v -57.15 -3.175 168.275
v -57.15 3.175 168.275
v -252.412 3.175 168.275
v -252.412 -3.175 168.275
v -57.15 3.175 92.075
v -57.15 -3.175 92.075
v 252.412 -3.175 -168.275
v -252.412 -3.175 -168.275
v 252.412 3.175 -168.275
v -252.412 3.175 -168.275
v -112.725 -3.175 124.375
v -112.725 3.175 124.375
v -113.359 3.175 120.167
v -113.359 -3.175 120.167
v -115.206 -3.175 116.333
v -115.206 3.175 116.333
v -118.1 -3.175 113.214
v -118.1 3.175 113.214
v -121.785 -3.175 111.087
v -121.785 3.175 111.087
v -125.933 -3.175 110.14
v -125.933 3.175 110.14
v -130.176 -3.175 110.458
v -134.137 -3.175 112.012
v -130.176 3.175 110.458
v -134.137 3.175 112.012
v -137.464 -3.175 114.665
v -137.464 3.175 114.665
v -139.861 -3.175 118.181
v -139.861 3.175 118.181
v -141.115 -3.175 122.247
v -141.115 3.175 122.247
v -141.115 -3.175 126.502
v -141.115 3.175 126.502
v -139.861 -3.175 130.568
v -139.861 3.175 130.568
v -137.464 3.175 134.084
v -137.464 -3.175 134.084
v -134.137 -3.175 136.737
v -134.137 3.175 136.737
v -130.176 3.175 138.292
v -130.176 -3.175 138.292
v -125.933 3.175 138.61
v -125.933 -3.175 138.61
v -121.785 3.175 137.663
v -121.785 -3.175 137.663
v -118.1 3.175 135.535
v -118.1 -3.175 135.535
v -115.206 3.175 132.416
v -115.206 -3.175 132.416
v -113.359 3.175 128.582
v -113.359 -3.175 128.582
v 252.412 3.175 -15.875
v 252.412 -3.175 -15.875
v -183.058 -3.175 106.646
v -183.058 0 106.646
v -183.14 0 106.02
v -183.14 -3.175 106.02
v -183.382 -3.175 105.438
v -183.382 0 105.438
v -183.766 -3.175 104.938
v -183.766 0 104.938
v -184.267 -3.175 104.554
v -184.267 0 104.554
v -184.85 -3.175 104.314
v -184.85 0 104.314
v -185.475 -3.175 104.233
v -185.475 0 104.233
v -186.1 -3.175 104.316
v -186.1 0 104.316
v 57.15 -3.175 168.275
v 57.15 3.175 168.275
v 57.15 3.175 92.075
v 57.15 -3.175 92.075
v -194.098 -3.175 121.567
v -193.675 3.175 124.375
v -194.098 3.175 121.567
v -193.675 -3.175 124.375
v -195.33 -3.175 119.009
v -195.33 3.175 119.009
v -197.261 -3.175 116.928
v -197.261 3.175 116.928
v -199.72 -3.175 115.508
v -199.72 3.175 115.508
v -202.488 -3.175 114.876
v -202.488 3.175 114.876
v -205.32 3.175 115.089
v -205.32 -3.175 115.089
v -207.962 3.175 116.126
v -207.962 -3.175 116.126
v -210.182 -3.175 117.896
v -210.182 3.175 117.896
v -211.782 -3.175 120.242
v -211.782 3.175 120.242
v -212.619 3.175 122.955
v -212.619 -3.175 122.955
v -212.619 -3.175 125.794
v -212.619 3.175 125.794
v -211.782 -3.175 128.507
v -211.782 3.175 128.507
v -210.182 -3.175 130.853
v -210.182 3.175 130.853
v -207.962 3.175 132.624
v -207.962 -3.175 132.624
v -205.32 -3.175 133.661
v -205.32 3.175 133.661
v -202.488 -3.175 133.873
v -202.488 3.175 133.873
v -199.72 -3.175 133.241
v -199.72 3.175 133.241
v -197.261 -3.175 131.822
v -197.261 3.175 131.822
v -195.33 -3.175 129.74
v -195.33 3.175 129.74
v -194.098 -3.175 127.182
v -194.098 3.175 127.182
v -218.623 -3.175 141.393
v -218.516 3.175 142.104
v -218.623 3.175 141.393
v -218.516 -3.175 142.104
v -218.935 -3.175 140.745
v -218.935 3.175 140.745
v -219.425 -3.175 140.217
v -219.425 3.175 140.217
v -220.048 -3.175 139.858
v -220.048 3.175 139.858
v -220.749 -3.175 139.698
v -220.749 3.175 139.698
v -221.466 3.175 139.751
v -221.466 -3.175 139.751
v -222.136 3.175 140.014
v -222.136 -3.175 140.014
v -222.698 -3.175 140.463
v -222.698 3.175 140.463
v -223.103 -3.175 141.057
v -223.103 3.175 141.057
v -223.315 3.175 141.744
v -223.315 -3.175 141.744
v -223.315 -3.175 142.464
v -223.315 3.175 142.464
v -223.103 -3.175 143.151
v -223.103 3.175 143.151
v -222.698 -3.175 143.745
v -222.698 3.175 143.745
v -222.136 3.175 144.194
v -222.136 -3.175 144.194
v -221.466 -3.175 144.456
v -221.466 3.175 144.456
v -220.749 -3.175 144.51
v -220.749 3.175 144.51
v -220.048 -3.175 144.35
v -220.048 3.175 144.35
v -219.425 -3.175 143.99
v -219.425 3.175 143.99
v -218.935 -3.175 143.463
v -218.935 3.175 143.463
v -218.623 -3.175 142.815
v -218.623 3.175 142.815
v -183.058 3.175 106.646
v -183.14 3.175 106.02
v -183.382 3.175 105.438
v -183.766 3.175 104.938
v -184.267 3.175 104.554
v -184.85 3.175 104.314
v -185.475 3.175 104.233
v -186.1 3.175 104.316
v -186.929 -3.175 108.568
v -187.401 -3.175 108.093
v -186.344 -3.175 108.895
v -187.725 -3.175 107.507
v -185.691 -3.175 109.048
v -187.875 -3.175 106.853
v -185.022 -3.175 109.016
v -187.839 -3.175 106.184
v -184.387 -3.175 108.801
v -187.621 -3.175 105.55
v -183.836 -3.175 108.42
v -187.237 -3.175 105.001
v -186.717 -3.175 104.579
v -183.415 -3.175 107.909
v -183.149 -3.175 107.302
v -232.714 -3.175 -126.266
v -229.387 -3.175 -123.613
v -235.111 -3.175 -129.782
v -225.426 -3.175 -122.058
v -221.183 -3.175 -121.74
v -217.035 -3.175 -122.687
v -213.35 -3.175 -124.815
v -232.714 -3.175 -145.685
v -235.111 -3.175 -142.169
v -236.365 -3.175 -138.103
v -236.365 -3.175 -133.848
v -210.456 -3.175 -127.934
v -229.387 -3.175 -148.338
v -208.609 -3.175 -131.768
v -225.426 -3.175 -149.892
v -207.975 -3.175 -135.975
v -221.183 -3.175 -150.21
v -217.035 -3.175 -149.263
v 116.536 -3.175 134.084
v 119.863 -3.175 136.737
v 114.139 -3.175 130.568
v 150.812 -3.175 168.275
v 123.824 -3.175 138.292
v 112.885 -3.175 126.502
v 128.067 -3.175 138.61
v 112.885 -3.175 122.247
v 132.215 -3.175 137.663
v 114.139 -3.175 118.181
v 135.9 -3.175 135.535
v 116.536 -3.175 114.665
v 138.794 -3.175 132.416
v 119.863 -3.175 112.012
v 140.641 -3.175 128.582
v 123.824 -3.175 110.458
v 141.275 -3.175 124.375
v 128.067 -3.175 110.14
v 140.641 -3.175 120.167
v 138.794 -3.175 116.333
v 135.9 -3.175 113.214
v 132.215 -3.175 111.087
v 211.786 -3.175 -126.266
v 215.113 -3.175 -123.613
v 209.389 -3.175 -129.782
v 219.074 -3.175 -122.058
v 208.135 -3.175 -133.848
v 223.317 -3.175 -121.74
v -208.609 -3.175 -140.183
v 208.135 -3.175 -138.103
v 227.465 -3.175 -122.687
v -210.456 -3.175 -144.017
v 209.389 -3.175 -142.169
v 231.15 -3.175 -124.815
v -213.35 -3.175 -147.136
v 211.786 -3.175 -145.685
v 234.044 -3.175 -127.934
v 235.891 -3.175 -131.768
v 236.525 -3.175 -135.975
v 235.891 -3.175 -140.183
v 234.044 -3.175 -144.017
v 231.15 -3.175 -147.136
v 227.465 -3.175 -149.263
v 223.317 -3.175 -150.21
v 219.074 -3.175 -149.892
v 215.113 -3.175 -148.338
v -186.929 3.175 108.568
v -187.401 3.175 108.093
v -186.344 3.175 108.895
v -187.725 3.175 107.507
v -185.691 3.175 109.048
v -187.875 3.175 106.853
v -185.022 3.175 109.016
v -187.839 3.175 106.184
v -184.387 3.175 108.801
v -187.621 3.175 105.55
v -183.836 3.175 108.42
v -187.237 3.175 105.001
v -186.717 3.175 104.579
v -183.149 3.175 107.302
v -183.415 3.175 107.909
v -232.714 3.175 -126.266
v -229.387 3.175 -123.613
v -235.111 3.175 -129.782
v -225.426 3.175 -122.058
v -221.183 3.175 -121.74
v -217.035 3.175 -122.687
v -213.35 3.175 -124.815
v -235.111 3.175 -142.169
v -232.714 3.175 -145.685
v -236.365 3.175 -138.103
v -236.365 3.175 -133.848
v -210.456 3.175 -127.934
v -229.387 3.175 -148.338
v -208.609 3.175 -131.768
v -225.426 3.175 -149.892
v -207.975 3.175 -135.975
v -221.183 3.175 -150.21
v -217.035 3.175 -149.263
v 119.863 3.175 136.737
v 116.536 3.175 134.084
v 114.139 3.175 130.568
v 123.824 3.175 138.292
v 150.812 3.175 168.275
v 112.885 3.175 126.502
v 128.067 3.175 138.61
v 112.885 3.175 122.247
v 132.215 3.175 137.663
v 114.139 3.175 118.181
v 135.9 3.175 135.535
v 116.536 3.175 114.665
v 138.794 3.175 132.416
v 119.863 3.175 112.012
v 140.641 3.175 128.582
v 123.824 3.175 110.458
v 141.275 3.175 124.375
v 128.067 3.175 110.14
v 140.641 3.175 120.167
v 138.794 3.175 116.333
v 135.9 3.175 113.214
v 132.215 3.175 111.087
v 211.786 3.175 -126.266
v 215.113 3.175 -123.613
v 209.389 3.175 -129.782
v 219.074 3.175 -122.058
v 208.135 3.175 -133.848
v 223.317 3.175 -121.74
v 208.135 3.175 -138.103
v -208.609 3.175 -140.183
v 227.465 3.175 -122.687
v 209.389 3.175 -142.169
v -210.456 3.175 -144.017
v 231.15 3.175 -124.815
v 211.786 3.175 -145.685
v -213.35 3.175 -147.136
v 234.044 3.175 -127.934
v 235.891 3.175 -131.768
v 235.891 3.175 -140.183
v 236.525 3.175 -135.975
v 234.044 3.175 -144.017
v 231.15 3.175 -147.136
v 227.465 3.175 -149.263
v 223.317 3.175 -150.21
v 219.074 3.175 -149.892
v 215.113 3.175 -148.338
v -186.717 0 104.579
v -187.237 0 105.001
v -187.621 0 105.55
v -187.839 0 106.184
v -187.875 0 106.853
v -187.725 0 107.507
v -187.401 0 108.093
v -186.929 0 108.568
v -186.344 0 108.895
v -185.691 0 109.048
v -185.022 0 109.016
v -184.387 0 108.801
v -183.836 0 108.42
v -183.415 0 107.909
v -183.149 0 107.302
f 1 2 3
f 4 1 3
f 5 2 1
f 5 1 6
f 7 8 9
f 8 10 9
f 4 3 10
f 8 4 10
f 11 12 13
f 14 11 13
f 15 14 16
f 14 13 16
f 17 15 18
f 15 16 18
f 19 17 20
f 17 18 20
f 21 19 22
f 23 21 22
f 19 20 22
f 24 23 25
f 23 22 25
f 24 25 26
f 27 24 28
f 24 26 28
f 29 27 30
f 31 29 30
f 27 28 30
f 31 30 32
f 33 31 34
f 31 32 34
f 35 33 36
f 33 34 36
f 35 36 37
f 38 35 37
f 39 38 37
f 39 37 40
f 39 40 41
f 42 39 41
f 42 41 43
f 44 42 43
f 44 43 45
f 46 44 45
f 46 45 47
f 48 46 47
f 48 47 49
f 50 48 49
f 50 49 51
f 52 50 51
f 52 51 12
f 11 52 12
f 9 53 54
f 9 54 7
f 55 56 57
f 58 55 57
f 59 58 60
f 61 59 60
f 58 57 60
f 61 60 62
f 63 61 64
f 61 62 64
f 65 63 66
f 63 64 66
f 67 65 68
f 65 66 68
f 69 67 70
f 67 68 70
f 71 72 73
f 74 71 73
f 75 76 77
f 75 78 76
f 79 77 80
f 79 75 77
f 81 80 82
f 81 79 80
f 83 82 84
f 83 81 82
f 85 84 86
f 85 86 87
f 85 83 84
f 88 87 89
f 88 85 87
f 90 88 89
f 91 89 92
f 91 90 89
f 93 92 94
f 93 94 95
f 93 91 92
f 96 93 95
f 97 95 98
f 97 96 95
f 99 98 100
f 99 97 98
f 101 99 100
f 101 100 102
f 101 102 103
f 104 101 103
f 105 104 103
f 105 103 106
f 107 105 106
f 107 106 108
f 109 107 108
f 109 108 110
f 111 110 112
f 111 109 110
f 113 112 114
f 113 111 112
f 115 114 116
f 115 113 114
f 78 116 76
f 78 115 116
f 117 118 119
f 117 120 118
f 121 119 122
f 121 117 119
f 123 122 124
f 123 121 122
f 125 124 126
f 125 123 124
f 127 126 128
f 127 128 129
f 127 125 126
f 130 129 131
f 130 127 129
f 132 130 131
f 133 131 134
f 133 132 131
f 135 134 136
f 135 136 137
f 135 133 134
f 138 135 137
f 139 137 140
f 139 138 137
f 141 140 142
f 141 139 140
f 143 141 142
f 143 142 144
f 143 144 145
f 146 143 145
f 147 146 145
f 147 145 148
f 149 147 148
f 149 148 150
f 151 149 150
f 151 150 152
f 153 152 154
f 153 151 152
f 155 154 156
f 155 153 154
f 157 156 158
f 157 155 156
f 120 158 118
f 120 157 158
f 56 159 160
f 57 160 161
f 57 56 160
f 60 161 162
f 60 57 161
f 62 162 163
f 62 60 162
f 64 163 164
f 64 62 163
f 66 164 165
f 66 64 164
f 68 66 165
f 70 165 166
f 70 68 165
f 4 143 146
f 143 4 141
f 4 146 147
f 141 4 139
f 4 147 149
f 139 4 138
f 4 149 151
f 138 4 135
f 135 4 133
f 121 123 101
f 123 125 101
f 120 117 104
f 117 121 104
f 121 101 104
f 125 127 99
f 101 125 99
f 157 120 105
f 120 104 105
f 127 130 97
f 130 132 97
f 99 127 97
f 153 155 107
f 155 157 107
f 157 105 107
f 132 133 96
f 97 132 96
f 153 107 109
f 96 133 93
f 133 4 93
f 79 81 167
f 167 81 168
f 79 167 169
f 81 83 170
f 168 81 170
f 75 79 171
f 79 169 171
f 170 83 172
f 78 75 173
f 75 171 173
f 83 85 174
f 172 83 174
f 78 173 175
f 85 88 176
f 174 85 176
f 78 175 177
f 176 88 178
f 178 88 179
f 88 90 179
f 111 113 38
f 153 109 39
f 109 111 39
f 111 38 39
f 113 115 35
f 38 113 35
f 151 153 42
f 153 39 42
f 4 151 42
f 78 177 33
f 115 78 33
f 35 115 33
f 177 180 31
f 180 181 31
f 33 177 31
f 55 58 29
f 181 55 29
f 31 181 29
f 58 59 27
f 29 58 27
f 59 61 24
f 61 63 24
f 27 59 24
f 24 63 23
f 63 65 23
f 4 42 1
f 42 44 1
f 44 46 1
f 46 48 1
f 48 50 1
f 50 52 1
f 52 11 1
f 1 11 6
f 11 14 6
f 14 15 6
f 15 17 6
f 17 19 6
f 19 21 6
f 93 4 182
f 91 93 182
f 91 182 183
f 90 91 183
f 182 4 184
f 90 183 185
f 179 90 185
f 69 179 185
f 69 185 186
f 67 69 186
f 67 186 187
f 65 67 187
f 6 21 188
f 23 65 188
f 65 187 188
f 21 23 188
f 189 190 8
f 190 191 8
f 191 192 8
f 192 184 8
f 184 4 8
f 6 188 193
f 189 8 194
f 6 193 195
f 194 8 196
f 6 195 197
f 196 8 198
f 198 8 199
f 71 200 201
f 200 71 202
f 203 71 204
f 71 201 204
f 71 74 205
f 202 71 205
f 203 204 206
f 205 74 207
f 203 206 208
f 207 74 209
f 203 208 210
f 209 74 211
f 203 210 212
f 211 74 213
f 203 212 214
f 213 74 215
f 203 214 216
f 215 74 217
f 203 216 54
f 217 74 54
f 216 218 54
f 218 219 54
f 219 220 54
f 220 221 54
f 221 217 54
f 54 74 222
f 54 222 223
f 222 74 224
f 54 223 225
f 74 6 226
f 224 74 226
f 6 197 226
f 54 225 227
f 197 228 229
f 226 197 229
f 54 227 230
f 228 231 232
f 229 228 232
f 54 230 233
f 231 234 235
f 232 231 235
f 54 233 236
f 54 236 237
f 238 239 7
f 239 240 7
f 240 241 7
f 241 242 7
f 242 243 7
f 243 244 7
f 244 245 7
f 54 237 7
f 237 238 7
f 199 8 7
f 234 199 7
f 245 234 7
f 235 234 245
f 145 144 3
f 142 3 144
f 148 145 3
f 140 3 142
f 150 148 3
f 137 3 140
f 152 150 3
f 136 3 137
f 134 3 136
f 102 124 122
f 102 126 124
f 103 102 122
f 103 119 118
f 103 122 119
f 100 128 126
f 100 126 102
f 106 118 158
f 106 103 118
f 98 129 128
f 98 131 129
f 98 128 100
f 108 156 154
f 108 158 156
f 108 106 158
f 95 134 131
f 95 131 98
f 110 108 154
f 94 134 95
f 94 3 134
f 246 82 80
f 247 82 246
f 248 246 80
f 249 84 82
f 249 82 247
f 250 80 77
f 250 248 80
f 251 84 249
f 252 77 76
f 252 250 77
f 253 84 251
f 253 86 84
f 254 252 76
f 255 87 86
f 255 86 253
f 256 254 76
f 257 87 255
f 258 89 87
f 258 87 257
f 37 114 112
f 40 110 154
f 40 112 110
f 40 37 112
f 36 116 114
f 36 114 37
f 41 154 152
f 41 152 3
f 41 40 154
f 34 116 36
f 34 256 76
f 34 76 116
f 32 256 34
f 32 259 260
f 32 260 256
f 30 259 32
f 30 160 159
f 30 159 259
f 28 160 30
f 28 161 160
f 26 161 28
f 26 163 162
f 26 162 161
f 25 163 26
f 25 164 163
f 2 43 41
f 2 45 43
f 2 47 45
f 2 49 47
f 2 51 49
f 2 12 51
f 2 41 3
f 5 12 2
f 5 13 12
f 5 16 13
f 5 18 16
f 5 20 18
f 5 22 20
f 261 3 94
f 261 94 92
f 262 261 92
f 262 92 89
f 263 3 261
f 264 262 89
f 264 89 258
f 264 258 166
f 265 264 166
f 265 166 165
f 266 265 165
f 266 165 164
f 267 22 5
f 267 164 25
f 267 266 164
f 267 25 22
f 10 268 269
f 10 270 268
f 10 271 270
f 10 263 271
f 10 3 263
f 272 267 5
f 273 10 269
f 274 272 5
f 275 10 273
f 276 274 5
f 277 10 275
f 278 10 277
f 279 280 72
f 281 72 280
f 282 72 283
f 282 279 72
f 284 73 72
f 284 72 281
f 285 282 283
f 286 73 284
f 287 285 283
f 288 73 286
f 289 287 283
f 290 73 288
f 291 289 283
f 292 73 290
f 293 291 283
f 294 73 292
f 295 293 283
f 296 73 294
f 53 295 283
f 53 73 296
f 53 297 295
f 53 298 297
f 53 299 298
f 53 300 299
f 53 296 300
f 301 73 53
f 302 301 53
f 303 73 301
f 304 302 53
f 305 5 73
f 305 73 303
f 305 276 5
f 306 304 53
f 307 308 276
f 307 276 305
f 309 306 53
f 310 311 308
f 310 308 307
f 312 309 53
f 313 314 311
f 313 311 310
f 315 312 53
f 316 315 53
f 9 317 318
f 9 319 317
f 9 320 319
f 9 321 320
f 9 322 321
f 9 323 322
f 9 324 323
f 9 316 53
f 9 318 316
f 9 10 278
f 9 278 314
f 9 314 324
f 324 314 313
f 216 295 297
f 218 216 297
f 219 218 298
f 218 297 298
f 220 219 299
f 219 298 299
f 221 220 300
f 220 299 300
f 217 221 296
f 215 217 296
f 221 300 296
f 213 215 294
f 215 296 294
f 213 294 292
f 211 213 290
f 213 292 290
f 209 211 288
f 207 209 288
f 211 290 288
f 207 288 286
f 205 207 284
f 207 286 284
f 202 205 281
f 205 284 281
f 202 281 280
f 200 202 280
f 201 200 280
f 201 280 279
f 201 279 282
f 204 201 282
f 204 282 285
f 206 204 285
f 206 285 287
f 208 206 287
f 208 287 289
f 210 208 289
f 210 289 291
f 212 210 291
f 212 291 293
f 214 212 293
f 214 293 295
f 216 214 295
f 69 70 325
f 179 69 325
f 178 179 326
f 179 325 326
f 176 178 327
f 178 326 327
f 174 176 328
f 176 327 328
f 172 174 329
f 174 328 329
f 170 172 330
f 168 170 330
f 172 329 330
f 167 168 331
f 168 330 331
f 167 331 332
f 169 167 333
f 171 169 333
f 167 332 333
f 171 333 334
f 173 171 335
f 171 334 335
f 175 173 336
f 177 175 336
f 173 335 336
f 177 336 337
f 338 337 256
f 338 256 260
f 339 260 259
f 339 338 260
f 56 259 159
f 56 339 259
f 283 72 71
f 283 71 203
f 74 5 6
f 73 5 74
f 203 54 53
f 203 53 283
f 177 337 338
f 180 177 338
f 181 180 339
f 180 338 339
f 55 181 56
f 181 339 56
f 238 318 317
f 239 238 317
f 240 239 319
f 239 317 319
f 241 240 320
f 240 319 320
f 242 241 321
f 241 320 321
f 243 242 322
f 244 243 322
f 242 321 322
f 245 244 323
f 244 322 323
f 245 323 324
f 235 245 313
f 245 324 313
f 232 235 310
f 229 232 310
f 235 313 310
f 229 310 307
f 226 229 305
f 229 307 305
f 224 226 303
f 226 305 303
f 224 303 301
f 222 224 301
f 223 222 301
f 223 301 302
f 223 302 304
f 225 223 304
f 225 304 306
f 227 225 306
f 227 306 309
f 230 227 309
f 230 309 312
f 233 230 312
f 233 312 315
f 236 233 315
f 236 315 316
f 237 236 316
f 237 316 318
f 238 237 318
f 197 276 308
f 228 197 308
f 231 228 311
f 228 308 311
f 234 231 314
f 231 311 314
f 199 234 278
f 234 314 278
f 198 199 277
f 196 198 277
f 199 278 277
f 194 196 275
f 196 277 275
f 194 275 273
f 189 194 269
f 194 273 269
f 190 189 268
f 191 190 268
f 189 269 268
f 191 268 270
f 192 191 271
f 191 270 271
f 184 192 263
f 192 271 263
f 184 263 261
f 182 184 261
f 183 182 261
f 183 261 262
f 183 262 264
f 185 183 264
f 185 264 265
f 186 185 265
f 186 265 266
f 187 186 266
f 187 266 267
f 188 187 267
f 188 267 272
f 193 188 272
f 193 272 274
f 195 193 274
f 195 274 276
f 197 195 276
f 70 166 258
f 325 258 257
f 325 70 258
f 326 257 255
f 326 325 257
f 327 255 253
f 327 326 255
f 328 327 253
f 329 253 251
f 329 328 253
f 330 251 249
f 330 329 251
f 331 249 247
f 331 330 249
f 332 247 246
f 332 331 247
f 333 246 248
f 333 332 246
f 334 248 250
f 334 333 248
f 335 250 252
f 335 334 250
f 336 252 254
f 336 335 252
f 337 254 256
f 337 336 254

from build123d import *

# Parameters (mm, degrees)
SKETCH1_W               = 504.825
SKETCH1_H               = 336.55
BOSS_EXTRUDE1_DEPTH     = 3.175
SKETCH2_R               = 14.2748
CUT_EXTRUDE1_DEPTH      = 7.35
CUT_EXTRUDE3_DEPTH      = 7.35
SKETCH6_W               = 114.3
SKETCH6_H               = 76.2
CUT_EXTRUDE4_DEPTH      = 7.35
SKETCH8_R               = 2.413
SKETCH8_R_2             = 9.525
BOSS_EXTRUDE3_DEPTH     = 3.175
CUT_EXTRUDE5_DEPTH      = 4.175
CUT_EXTRUDE5_DEPTH_BACK = 4.175


with BuildPart() as part:
    # Sketch1 → Boss-Extrude1 (new body, symmetric)
    with BuildSketch(Plane(origin=(0, 0, 0), x_dir=(1, 0, 0), z_dir=(0, 1, 0))):
        Rectangle(SKETCH1_W, SKETCH1_H)
    extrude(amount=BOSS_EXTRUDE1_DEPTH, both=True)

    # Sketch2 → Cut-Extrude1 (cut, through all)
    with BuildSketch(Plane(origin=(0, 3.175, 0), x_dir=(1, 0, 0), z_dir=(0, 1, 0))):
        with Locations((-222.25, 135.975286336)):
            Circle(SKETCH2_R)
        with Locations((222.25, 135.975286336)):
            Circle(SKETCH2_R)
        with Locations((-127, -124.374713664)):
            Circle(SKETCH2_R)
        with Locations((127, -124.374713664)):
            Circle(SKETCH2_R)
    extrude(amount=-CUT_EXTRUDE1_DEPTH, mode=Mode.SUBTRACT)

    # Sketch5 → Cut-Extrude3 (cut, through all)
    with BuildSketch(Plane.XZ.offset(3.175)):
        Polygon((252.4125, 168.275), (252.4125, -15.875), (150.8125, 168.275), align=None)
        Polygon((-252.4125, -15.875), (-150.8125, 168.275), (-252.4125, 168.275), align=None)
    extrude(amount=-CUT_EXTRUDE3_DEPTH, mode=Mode.SUBTRACT)

    # Sketch6 → Cut-Extrude4 (cut, through all)
    with BuildSketch(Plane(origin=(0, 3.175, 0), x_dir=(1, 0, 0), z_dir=(0, 1, 0))):
        with Locations((0, -130.175)):
            Rectangle(SKETCH6_W, SKETCH6_H)
    extrude(amount=-CUT_EXTRUDE4_DEPTH, mode=Mode.SUBTRACT)

    # Sketch8 → Boss-Extrude3 (add, symmetric)
    with BuildSketch(Plane(origin=(0, 0, 0), x_dir=(1, 0, 0), z_dir=(0, 1, 0))):
        with Locations((-185.4708, -106.645513664)):
            Circle(SKETCH8_R)
        Polygon((-252.4125, 15.875), (-150.8125, -168.275), (-252.4125, -168.275), align=None)
        with Locations((-220.9292, -142.103913664)):
            Circle(SKETCH8_R, mode=Mode.SUBTRACT)
        with Locations((-203.2, -124.374713664)):
            Circle(SKETCH8_R_2, mode=Mode.SUBTRACT)
        with BuildLine():
            ThreePointArc((-183.0578, -106.645513664), (-184.003859621, -104.729618332), (-186.100199439, -104.316044767))
            Line((-186.100199439, -104.316044767), (-183.83584242, -108.420191864))
            ThreePointArc((-183.83584242, -108.420191864), (-183.260854114, -107.614383201), (-183.0578, -106.645513664))
        make_face()
        with BuildLine():
            Line((-183.83584242, -108.420191864), (-186.100199439, -104.316044767))
            ThreePointArc((-186.100199439, -104.316044767), (-187.583568952, -107.811179293), (-183.83584242, -108.420191864))
        make_face()
    extrude(amount=BOSS_EXTRUDE3_DEPTH, both=True)

    # Sketch8<3> → Cut-Extrude5 (cut, two sides)
    with BuildSketch(Plane(origin=(0, 0, 0), x_dir=(1, 0, 0), z_dir=(0, 1, 0))) as cut_extrude5_sk:
        with BuildLine():
            ThreePointArc((-183.0578, -106.645513664), (-184.003859621, -104.729618332), (-186.100199439, -104.316044767))
            Line((-186.100199439, -104.316044767), (-183.83584242, -108.420191864))
            ThreePointArc((-183.83584242, -108.420191864), (-183.260854114, -107.614383201), (-183.0578, -106.645513664))
        make_face()
        with BuildLine():
            Line((-183.83584242, -108.420191864), (-186.100199439, -104.316044767))
            ThreePointArc((-186.100199439, -104.316044767), (-187.583568952, -107.811179293), (-183.83584242, -108.420191864))
        make_face()
    extrude(amount=CUT_EXTRUDE5_DEPTH, mode=Mode.SUBTRACT)
    extrude(cut_extrude5_sk.sketch, amount=-CUT_EXTRUDE5_DEPTH_BACK, mode=Mode.SUBTRACT)


solid = part.part
